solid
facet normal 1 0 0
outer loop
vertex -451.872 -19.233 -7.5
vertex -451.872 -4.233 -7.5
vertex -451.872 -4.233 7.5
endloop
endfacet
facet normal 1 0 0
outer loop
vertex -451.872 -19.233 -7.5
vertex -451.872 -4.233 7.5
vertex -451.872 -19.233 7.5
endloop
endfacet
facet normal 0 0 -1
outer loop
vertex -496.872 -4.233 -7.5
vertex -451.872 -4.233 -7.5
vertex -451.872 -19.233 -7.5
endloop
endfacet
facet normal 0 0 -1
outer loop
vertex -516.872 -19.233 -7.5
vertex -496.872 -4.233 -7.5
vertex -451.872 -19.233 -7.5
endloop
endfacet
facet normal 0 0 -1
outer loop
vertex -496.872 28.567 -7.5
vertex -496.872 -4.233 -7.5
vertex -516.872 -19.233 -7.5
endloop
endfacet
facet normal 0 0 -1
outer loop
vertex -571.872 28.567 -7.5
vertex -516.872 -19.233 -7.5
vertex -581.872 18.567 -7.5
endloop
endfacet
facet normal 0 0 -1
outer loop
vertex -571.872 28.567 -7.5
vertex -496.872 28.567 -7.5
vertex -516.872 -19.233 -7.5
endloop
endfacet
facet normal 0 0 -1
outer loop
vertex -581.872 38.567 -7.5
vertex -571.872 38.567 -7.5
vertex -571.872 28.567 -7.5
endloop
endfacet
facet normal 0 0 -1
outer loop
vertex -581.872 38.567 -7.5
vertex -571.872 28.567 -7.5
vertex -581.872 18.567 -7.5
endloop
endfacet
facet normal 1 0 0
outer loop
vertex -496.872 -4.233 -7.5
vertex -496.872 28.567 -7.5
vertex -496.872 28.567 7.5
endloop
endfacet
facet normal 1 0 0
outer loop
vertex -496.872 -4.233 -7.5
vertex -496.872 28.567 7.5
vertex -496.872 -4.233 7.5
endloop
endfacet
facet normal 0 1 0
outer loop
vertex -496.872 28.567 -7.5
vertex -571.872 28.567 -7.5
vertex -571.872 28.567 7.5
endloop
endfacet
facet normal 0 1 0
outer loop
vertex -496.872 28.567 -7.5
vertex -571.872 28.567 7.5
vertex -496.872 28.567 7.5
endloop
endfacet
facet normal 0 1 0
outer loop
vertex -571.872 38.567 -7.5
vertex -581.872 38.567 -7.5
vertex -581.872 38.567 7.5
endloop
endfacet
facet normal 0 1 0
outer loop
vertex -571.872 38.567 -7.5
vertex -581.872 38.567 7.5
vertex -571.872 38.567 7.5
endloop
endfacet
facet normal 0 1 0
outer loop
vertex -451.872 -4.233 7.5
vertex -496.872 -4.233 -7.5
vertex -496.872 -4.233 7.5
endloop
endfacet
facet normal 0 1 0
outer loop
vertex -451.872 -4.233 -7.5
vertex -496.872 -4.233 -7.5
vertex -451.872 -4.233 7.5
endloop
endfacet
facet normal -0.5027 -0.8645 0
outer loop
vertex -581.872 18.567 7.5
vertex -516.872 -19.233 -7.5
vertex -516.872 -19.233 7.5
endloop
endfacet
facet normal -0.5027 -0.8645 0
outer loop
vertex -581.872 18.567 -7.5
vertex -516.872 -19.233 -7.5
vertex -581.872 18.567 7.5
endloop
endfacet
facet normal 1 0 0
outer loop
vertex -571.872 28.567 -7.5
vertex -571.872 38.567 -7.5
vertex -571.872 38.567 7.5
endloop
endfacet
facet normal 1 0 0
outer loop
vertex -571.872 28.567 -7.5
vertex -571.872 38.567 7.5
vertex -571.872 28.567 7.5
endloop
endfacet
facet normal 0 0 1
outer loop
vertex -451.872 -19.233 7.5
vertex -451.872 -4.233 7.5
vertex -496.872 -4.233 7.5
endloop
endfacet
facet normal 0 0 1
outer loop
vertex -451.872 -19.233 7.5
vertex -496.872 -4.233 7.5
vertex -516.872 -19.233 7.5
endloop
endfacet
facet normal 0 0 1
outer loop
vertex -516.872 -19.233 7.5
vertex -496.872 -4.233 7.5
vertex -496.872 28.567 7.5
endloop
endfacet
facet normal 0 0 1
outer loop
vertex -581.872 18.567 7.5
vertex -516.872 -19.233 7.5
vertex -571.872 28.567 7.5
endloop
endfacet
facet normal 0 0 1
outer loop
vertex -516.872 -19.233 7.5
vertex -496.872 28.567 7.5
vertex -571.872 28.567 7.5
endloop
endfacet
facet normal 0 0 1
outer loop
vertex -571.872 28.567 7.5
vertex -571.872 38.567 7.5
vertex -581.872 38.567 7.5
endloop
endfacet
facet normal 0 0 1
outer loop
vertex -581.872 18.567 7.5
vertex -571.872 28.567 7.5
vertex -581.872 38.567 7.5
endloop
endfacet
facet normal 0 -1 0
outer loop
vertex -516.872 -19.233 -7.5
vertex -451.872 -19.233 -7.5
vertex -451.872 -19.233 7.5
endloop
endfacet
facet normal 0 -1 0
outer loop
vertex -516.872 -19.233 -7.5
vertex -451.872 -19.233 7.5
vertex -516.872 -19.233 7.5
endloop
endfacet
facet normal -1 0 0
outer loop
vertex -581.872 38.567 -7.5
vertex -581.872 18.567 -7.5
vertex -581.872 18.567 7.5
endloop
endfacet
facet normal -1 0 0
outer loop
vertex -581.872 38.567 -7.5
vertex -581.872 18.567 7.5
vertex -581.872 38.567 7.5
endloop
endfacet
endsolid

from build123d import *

# Parameters (mm, degrees)
BOSS_EXTRUDE1_DEPTH      = 7.5
BOSS_EXTRUDE1_DEPTH_BACK = 7.5


with BuildPart() as part:
    # Sketch1 → Boss-Extrude1 (new, two sides: drawn at the far end of the back side and taken through both)
    with BuildSketch(Plane.XY.offset(-BOSS_EXTRUDE1_DEPTH_BACK)):
        Polygon((-451.871999052, -4.232779954), (-451.871999052, -19.232779954), (-516.871999052, -19.232779954), (-581.871999052, 18.567220046), (-581.871999052, 38.567220046), (-571.871999052, 38.567220046), (-571.871999052, 28.567220046), (-496.871999052, 28.567220046), (-496.871999052, -4.232779954), align=None)
    extrude(amount=BOSS_EXTRUDE1_DEPTH + BOSS_EXTRUDE1_DEPTH_BACK)


solid = part.part
